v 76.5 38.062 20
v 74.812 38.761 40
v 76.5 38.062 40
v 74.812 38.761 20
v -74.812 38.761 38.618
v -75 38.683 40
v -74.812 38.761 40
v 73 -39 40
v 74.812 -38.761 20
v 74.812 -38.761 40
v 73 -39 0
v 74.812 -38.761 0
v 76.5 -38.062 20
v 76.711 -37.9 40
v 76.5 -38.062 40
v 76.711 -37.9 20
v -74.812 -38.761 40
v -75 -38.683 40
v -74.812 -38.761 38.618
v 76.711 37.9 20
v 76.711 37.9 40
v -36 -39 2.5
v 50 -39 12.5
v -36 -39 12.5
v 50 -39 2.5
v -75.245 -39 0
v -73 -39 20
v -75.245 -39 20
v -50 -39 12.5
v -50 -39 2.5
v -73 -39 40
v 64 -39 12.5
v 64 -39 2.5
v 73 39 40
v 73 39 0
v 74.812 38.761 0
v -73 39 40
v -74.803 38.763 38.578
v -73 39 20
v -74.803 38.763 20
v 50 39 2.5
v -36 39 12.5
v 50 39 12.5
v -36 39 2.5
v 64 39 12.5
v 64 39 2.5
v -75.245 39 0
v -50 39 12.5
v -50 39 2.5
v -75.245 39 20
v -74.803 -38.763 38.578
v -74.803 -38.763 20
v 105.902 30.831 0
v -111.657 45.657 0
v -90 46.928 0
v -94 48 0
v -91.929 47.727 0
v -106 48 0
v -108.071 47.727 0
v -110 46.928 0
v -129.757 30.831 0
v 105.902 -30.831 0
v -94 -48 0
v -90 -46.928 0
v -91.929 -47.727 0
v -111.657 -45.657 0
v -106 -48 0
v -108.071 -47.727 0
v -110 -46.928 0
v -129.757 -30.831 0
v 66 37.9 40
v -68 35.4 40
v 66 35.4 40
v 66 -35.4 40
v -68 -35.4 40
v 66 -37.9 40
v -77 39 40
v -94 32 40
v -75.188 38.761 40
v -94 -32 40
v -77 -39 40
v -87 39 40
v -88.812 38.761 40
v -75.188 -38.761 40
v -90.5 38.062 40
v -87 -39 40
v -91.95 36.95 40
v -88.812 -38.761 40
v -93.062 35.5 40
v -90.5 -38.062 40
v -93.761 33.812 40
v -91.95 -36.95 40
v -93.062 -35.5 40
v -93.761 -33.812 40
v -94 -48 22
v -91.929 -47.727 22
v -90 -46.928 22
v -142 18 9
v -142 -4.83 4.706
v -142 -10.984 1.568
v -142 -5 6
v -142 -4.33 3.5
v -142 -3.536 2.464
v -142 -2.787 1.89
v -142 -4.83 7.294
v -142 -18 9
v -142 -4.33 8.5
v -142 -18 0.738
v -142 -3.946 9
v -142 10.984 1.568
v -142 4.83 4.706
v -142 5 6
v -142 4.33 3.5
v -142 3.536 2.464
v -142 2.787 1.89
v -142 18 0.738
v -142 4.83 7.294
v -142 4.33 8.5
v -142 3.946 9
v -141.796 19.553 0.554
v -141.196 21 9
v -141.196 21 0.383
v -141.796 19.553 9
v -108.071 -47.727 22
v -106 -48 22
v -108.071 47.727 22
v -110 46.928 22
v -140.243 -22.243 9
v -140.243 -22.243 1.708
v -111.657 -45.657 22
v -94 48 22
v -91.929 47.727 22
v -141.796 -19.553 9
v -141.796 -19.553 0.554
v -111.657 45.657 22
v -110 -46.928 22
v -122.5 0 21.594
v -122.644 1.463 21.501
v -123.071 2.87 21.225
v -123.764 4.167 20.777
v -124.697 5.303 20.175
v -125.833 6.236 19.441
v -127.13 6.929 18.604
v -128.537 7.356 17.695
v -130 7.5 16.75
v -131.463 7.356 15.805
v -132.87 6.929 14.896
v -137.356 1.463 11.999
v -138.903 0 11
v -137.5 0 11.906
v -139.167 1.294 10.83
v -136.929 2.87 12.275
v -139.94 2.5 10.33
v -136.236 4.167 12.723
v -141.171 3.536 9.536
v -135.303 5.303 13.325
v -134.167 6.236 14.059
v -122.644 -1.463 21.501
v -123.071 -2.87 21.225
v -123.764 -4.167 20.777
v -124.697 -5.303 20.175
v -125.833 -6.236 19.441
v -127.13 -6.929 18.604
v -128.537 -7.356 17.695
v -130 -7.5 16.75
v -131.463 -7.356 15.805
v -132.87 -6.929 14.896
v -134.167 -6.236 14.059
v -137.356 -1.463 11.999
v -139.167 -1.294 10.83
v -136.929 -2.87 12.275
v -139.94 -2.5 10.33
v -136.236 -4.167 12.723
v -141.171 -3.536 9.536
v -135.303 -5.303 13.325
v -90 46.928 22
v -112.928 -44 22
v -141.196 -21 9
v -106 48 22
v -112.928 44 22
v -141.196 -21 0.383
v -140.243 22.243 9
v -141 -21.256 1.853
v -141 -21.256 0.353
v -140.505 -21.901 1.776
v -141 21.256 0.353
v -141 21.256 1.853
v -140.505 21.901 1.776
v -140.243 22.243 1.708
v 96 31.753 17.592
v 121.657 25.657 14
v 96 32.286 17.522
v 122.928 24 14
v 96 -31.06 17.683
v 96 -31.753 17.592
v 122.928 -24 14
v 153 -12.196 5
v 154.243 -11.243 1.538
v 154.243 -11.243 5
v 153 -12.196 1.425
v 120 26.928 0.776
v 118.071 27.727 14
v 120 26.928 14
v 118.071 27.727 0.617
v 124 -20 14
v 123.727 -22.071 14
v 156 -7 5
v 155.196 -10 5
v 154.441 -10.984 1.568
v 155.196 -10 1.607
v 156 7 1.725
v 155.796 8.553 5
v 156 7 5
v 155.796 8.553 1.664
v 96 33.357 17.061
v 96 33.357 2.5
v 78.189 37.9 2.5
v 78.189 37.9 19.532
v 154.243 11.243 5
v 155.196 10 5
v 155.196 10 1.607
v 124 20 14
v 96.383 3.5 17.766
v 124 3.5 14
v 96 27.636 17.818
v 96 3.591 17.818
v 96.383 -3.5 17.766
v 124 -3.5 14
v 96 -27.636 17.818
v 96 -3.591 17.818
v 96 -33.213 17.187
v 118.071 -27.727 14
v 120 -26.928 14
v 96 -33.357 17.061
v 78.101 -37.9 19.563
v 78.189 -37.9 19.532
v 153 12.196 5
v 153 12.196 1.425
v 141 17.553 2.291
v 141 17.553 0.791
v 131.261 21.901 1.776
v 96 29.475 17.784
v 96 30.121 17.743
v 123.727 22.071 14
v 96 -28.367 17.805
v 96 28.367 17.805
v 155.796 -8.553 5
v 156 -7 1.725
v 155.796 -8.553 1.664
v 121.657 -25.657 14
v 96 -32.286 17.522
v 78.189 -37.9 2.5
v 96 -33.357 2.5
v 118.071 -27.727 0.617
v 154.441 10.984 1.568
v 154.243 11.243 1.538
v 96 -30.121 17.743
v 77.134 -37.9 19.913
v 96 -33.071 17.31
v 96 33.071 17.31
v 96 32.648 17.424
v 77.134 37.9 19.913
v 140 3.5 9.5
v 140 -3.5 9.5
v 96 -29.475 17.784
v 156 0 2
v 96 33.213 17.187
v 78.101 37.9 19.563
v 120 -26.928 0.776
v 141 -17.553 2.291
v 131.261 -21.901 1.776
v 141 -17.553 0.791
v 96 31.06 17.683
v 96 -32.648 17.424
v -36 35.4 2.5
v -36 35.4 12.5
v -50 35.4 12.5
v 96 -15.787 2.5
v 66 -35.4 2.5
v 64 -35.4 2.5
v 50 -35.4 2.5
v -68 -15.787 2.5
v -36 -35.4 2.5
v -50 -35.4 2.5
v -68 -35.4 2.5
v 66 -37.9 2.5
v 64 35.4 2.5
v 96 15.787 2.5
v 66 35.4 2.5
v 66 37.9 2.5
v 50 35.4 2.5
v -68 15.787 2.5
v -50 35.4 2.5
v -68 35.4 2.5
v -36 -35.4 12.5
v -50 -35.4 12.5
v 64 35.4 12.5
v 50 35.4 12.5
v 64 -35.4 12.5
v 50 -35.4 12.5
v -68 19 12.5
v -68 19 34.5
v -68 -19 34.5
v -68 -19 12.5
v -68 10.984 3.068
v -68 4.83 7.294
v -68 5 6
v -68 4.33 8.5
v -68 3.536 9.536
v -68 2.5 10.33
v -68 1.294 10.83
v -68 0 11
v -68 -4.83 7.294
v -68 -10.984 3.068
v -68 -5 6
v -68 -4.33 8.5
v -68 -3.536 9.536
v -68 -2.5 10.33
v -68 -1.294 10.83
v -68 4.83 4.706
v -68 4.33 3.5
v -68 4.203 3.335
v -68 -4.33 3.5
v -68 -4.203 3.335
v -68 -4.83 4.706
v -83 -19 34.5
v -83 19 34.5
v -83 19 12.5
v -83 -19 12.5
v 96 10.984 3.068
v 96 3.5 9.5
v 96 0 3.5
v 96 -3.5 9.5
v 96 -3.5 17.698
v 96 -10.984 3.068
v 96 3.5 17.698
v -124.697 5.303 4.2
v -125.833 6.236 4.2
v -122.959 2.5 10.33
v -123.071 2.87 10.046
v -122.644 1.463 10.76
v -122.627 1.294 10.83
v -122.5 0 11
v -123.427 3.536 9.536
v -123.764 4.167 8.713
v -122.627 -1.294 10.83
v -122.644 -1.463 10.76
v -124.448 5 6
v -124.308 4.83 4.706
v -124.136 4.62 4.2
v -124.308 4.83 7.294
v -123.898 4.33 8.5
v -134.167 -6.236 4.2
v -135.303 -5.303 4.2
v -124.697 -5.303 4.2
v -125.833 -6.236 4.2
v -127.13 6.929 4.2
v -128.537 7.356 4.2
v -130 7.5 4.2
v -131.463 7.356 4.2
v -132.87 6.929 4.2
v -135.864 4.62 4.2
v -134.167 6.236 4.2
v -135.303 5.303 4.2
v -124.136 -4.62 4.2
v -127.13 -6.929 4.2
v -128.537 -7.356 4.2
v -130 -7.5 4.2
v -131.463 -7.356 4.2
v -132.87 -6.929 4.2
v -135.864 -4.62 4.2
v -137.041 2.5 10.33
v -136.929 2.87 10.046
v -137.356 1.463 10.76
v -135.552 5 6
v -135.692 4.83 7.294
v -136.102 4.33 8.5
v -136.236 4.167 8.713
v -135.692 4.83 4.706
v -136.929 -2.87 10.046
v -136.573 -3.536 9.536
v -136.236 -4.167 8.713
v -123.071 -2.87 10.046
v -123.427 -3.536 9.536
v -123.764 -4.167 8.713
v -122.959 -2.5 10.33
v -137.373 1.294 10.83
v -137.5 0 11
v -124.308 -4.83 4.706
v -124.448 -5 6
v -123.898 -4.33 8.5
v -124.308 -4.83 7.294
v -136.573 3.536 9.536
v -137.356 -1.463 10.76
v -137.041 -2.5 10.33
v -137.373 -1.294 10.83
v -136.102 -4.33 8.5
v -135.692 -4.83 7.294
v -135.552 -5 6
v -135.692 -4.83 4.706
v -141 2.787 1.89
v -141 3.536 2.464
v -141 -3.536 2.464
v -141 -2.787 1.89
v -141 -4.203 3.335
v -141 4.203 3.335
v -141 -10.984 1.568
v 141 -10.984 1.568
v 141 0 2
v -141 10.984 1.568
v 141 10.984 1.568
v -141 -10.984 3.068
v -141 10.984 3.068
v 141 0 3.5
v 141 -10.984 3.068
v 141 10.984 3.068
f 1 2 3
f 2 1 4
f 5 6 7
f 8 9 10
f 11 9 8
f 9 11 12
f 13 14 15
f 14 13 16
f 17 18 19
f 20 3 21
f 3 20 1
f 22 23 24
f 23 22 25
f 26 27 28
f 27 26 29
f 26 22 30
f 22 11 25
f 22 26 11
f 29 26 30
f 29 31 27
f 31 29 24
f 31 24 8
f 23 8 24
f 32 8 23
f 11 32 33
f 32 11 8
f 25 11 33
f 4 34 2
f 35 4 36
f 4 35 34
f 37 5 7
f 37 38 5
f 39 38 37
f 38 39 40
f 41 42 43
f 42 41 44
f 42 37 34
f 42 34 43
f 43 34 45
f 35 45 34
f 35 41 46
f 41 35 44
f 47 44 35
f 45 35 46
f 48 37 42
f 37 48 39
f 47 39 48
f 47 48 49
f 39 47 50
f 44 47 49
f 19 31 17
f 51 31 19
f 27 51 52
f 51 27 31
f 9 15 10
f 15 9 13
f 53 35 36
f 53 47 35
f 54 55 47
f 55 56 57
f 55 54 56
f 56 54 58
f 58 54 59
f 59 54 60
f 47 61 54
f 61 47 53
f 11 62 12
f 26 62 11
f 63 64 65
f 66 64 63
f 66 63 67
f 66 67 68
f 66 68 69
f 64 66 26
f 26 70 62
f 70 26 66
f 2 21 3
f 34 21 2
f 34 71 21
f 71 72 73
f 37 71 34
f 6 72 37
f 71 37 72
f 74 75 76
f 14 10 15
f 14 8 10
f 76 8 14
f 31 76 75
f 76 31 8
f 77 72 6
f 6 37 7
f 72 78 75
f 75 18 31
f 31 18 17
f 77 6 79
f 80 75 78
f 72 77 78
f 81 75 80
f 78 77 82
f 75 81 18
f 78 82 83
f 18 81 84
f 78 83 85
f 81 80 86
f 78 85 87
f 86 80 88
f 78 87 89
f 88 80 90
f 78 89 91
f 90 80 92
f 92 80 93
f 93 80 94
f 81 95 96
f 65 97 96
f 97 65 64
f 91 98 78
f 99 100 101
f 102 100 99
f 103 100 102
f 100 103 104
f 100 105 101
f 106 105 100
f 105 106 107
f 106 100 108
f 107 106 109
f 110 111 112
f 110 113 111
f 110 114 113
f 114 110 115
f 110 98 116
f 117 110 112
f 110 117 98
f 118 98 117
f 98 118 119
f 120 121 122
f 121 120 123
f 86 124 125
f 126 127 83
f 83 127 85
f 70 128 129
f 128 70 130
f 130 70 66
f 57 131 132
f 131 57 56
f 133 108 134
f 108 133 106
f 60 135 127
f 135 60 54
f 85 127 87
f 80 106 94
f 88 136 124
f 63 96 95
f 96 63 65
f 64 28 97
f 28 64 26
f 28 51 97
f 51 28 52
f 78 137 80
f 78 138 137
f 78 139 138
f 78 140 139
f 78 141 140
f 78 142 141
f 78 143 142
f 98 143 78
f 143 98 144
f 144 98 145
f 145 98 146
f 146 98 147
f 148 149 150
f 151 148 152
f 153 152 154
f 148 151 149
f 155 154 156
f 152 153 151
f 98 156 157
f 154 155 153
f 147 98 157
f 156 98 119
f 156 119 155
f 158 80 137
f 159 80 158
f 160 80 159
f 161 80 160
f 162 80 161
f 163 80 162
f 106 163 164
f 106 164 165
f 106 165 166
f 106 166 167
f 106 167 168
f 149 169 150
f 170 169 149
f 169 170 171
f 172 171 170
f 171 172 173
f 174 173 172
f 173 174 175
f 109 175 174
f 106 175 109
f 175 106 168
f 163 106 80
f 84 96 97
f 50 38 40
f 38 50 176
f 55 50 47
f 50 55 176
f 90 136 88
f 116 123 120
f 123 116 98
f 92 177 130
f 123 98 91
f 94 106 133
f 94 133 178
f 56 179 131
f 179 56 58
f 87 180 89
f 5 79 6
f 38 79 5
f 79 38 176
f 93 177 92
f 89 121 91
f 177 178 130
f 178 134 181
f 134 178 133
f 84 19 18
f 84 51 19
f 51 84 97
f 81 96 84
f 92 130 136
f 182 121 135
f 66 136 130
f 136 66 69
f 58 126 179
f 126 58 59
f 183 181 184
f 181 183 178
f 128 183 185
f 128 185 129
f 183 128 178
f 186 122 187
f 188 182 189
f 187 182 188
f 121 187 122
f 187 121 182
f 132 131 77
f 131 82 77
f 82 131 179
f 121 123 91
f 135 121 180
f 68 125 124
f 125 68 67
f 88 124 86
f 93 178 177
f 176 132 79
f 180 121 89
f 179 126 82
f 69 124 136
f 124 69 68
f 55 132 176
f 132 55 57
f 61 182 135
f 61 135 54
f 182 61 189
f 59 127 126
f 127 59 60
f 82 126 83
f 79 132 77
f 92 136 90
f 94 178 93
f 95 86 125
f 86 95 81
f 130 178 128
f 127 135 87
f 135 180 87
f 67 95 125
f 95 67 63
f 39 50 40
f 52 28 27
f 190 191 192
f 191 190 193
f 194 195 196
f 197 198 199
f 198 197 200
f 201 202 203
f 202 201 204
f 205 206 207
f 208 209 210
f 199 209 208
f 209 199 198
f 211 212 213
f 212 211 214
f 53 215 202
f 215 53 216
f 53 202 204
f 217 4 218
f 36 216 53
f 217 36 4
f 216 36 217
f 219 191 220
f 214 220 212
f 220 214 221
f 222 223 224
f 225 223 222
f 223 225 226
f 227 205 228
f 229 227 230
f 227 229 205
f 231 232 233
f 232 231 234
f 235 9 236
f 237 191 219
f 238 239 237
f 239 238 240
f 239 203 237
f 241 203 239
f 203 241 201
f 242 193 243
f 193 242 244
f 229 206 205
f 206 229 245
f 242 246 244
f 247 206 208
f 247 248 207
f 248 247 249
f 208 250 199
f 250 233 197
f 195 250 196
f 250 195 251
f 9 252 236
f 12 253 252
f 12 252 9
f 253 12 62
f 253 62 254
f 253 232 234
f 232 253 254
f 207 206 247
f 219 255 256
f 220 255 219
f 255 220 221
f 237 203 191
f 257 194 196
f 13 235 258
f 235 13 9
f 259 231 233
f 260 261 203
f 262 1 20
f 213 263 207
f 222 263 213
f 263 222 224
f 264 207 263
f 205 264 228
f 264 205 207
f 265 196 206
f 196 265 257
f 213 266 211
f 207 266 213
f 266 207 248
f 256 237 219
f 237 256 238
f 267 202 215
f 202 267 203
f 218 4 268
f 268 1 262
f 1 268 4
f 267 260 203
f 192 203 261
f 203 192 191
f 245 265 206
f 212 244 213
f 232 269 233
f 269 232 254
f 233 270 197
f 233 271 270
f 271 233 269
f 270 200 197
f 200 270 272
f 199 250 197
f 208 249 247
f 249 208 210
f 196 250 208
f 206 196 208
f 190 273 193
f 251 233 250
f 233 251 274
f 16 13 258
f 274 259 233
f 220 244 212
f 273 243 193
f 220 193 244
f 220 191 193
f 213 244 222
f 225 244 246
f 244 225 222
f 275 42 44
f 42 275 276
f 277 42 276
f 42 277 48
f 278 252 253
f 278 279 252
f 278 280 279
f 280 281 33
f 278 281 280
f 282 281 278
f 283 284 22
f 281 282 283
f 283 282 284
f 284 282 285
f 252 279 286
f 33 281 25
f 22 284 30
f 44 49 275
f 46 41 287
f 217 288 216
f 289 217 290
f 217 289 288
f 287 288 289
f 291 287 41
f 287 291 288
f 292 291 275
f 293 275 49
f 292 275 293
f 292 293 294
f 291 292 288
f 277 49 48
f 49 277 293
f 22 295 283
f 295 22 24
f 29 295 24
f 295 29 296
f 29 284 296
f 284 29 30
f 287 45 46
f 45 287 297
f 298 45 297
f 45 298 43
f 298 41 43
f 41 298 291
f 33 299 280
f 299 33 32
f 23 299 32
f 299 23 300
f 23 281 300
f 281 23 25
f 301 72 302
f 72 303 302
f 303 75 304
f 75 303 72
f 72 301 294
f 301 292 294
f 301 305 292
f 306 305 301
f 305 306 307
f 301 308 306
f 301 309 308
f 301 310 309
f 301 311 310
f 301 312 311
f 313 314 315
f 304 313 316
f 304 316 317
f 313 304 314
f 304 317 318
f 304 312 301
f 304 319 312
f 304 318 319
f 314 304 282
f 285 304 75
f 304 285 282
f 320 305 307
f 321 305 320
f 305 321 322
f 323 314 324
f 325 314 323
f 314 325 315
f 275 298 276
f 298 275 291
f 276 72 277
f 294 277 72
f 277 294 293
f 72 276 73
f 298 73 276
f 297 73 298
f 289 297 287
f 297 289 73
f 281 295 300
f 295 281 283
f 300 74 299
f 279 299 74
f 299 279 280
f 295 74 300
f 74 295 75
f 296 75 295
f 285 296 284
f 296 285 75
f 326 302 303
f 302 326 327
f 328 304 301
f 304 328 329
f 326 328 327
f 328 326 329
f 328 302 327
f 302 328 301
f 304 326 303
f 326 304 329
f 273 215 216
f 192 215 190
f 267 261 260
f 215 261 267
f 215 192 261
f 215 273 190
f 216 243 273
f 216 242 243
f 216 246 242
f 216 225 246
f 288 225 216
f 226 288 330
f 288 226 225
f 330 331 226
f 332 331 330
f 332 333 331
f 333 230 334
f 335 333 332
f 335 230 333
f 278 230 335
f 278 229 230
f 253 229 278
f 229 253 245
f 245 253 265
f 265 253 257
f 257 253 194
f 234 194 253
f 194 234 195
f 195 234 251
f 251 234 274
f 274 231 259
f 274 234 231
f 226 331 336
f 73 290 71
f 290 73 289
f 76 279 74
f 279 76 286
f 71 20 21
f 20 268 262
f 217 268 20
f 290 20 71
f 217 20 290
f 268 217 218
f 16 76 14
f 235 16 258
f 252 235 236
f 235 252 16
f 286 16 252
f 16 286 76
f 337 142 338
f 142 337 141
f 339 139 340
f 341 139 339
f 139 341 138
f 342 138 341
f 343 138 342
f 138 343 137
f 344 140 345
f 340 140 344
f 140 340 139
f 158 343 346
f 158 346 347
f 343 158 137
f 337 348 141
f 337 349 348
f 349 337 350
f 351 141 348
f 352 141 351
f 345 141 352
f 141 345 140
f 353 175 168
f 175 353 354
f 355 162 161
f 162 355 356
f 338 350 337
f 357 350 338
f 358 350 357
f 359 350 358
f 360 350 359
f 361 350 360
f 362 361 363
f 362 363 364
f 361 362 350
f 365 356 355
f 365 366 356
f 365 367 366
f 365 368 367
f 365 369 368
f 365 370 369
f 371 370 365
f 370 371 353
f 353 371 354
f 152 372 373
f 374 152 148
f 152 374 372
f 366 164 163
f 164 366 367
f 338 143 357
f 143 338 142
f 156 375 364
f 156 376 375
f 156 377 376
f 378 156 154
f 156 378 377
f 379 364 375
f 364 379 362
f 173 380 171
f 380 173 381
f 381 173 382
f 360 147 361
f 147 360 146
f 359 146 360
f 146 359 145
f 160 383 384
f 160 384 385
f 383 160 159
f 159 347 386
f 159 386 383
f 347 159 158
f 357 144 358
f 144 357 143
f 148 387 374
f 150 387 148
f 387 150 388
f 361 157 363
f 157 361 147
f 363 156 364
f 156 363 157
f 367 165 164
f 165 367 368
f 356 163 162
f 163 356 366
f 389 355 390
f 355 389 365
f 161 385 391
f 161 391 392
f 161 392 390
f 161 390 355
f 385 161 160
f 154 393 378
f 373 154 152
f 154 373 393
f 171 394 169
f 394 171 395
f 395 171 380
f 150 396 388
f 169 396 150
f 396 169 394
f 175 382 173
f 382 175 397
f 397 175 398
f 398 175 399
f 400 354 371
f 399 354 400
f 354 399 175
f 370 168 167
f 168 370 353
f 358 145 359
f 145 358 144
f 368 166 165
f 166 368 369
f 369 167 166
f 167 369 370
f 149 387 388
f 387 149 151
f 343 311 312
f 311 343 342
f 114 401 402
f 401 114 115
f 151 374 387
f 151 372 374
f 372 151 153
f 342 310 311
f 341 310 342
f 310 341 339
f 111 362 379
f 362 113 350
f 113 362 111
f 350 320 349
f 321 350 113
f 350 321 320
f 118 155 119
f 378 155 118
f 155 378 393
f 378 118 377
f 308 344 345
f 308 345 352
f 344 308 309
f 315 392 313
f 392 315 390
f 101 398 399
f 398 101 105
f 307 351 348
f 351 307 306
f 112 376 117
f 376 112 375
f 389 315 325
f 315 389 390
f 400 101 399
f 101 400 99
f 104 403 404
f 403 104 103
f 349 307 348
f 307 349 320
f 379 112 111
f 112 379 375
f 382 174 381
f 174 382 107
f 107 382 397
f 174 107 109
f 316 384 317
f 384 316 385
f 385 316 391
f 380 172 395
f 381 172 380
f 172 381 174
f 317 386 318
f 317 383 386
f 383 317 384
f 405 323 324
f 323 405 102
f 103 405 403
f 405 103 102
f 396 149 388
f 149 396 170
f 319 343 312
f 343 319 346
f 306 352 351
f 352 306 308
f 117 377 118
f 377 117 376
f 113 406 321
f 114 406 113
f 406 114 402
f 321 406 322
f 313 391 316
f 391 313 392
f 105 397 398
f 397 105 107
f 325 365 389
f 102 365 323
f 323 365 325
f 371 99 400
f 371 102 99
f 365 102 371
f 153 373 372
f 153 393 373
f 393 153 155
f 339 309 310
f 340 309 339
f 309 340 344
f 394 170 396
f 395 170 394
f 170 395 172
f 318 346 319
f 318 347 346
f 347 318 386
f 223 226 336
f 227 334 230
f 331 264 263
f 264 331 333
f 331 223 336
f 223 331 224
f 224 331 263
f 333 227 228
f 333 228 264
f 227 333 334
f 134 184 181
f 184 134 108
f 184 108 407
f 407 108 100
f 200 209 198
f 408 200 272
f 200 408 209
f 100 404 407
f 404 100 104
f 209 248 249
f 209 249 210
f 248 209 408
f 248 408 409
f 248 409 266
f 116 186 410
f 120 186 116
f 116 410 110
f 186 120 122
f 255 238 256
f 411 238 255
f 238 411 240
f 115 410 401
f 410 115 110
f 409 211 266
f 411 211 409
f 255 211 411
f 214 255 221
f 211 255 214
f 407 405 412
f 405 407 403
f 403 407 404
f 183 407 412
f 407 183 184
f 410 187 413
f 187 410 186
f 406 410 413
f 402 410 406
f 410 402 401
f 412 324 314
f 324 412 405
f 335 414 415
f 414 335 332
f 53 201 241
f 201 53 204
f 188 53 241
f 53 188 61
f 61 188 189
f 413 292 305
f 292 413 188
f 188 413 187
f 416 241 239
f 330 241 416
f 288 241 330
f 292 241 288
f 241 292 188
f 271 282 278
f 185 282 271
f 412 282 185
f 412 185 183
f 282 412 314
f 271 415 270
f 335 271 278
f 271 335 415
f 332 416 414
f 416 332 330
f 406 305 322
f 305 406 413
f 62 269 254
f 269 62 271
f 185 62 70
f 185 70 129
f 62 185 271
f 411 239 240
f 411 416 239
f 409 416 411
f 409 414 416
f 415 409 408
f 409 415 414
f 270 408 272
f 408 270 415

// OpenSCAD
// file: parts/007_pod_slide_dock_core.scad
// =============================================================================
// OpenMotorBridge - Satellite Pod: Open-Top Slide-In Dock Core (Aufnahmedock)
// =============================================================================
// File: hardware/cad/scad/02_pod_base/parts/007_pod_slide_dock_core.scad
// Description: Parametric core module defining the open-top cradle cavity for the
//              standard, 100% unchanged universal Pod base housing (135 x 70 x 38 mm).
//              Features:
//              1. 0.5 mm sliding clearance (135.5 x 70.5 x 38.0 mm)
//              2. Open top: Pod roof with Gore-Vent & GNSS patch antenna is exposed
//              3. Front M8 gland neck pocket (facing forward towards seat, -X)
//              4. Rear cartridge entrance mouth (facing rearward towards tail, +X)
//              5. Flank pockets for 4x EPDM strap hook lugs (X = 25 & 110 mm)
//              6. Transverse fender crown cradle at bottom
// =============================================================================

include <../../00_common/parameters.scad>;

// Standard Pod External Dimensions with clearance
DOCK_POD_L = POD_OUTER_L + 0.6; // 135.6 mm
DOCK_POD_W = POD_OUTER_W + 0.6; // 70.6 mm
DOCK_POD_H = POD_OUTER_H + 0.2; // 38.2 mm

// Subtraction tool to hollow out the open-top dock cradle
// Origin centered at (X = 0, Y = 0, Z = floor of dock)
module pod_slide_dock_subtraction(
    dock_l = DOCK_POD_L,
    dock_w = DOCK_POD_W,
    dock_h = DOCK_POD_H,
    open_sky_h = 50.0 // Cut through all material above pod roof
) {
    // 1. Main Pod Cavity (centered in X and Y, sitting at Z = 0 .. dock_h)
    translate([-dock_l/2.0, -dock_w/2.0, 0.0]) {
        // Main pod block plus infinite top clearance so pod roof is 100% exposed
        cube([dock_l, dock_w, dock_h + open_sky_h], center=false);
    }

    // 2. 4x Flank Pockets for Pod EPDM Strap Hooks
    // Hooks are located at X = 25.0 and X = 110.0 from pod front (-dock_l/2.0)
    // Hook width 8 mm, protrusion 3.0 mm, height 5 mm
    hook_x_offsets = [-dock_l/2.0 + 25.0, -dock_l/2.0 + (POD_OUTER_L - 25.0)];
    for (hx = hook_x_offsets) {
        // Left flank pocket (Y = +dock_w/2.0)
        translate([hx - 7.0, dock_w/2.0 - 0.5, 0.0])
            cube([14.0, 5.0, 10.0], center=false);

        // Right flank pocket (Y = -dock_w/2.0 - 4.5)
        translate([hx - 7.0, -dock_w/2.0 - 4.5, 0.0])
            cube([14.0, 5.0, 10.0], center=false);
    }

    // 3. Front Dual-Port Connector Pocket (facing -X towards seat)
    // Spans Port A (M8 at Y = -8.0 mm) and Port B (USB-C at Y = +8.0 mm)
    translate([-dock_l/2.0 - 15.0, -19.0, 19.0 - 9.0])
        cube([16.0, 38.0, 22.0], center=false);

    // 4. Rear Mouth Clearance (facing +X towards tail)
    // Allows the cartridge faceplate (width 74 mm, height 34 mm) to slide through cleanly
    translate([dock_l/2.0 - 2.0, -dock_w/2.0 - 2.5, 0.0])
        cube([30.0, dock_w + 5.0, dock_h + open_sky_h], center=false);
}

// Standalone preview module
module pod_slide_dock_preview() {
    difference() {
        // Outer demonstration block
        translate([-(DOCK_POD_L + 16.0)/2.0, -(DOCK_POD_W + 16.0)/2.0, -4.0])
            cube([DOCK_POD_L + 16.0, DOCK_POD_W + 16.0, DOCK_POD_H + 4.0], center=false);

        // Subtract the open dock cavity
        pod_slide_dock_subtraction();
    }
}

// Standalone execution preview
pod_slide_dock_preview();
// main file
// =============================================================================
// OpenMotorBridge - Satellite Pod 3: Touring Stealth Console (Typ D2)
// =============================================================================
// File: hardware/cad/scad/02_pod_base/pod3_touring_stealth_console.scad
// Description: Low-profile, OEM-integrated open-dock mounting console for
//              classic baggers and cruisers with 2-Up passenger seat.
//              Key Architecture:
//              1. 100% UNCHANGED POD: Fits the universal Pod base housing
//                 (pod_base_housing.stl, 135 x 70 x 38 mm) with 0.5 mm sliding fit.
//              2. OPEN-TOP DOCK: Zero double-housing! Pod roof with Gore-Vent breather
//                 and GNSS patch antenna is 100% exposed directly to the sky.
//              3. OEM PASSENGER SEAT MOUNTING: Front tongue anchors directly to the
//                 factory 1/4"-20 UNC fender nut behind the passenger seat.
//              4. SEAT-CONTOUR FRONT: Front hugs the curved tail of the passenger seat.
//              5. CONCEALED FORWARD CABLE ROUTING: M8 cable dives directly forward
//                 under the passenger seat into the bike's electrical harness.
//              6. REAR CARTRIDGE ACCESS & ANTENNA INTEGRATION: Cartridge slides in/out
//                 from the rear; smooth rear teardrop ducktail features a recessed
//                 aerodynamic snap-in clip channel for the rear-facing antenna.
//              7. FENDER PROTECTION: Compound concave saddle underside (R=140 mm
//                 transverse / R=320 mm longitudinal) with 1.5 mm EPDM pad recess.
// =============================================================================

include <../00_common/parameters.scad>;
use <parts/007_pod_slide_dock_core.scad>;

FENDER_R_TRANS = 140.0; // Harley Touring transverse crown radius (mm)
FENDER_R_LONG  = 320.0; // Harley Touring longitudinal wheel arch radius (mm)

// Dimensional Constants
TOURING_POD_L   = 136.0; // Dock bay length in X (centered at X=0)
TOURING_FUSE_W  = 78.0;  // Center fuselage width in Y (mm)
TOURING_SEAT_W  = 96.0;  // Front width hugging passenger seat in Y (mm)
TOURING_DOCK_H  = 40.0;  // Center rim height in Z (mm)
HALF_MOUTH_H    = 22.0;  // Front mouth connection height (half-height of pod)

// Longitudinal extents (mm):
// Front tip (1/4"-20 screw): X = -142.0
// Front pod mouth:           X = -68.0
// Rear pod mouth:            X = +68.0
// Rear teardrop tip:         X = +160.0
X_FRONT_TIP = -142.0;
X_POD_FRONT = -68.0;
X_POD_REAR  = +68.0;
X_REAR_TIP  = +160.0;

// Helper: 2D rounded rectangle extruded in Z for soft organic edges
module rounded_slab(l, w, h, r=6.0) {
    linear_extrude(height=h, center=false) {
        hull() {
            for (dx = [-l/2 + r, l/2 - r]) {
                for (dy = [-w/2 + r, w/2 - r]) {
                    translate([dx, dy]) circle(r=r, $fn=24);
                }
            }
        }
    }
}

module pod3_touring_stealth_console() {
    difference() {
        union() {
            // 1. Center Fuselage Cradle with soft rounded flanks (X in [-68, +68])
            hull() {
                translate([-TOURING_POD_L/2.0 + 1.0, 0, 0])
                    rounded_slab(2.0, TOURING_FUSE_W, TOURING_DOCK_H, r=7.0);
                translate([TOURING_POD_L/2.0 - 1.0, 0, 0])
                    rounded_slab(2.0, TOURING_FUSE_W, TOURING_DOCK_H, r=7.0);
            }

            // 2. Front Seat-Contoured Transition (The "SCHRÄGE", Full Height Z = 40.0 mm, X in [-142, -82])
            hull() {
                // Peak of front ramp (Full height Z = 40 mm)
                translate([-82.0, 0, 0])
                    rounded_slab(4.0, TOURING_FUSE_W, TOURING_DOCK_H, r=7.0);

                // Mid transition step hugging passenger seat tail
                translate([X_POD_FRONT - 32.0, 0, 0])
                    rounded_slab(4.0, TOURING_SEAT_W, 22.0, r=8.0);

                // Front 1/4"-20 mounting tongue tab
                translate([X_FRONT_TIP + 10.0, 0, 0])
                    rounded_slab(20.0, 48.0, 9.0, r=6.0);
            }

            // 3. Intermediate Waist (The "ETWAS_FREI" -> HALBHOCH, Z = 20.0 mm, X in [-82, -68])
            // Connects the full-height front ramp and full-height cradle at half height
            hull() {
                translate([-82.0, 0, 0])
                    rounded_slab(4.0, TOURING_FUSE_W, 20.0, r=7.0);
                translate([X_POD_FRONT, 0, 0])
                    rounded_slab(4.0, TOURING_FUSE_W, 20.0, r=7.0);
            }

            // 4. Rear Teardrop Ducktail at Kassetteneinschub (X in [+68, +160])
            // Connects HALF-HIGH (Z = 20.0 mm) at the rear cartridge mouth for tool-free finger access
            hull() {
                // Junction at rear pod mouth (half-height Z = 20 mm)
                translate([X_POD_REAR - 1.0, 0, 0])
                    rounded_slab(2.0, TOURING_FUSE_W, 20.0, r=7.0);

                // Mid slope
                translate([X_POD_REAR + 42.0, 0, 0])
                    rounded_slab(4.0, 56.0, 14.0, r=8.0);

                // Rear teardrop tip
                translate([X_REAR_TIP - 12.0, 0, 0])
                    rounded_slab(16.0, 26.0, 5.0, r=6.0);
            }

            // Rear flank blend: raises side walls from half-height rear mouth up to 40 mm
            hull() {
                translate([X_POD_REAR - 1.0, 0, 0])
                    rounded_slab(2.0, TOURING_FUSE_W, 20.0, r=7.0);
                translate([X_POD_REAR - 16.0, 0, 0])
                    rounded_slab(2.0, TOURING_FUSE_W, TOURING_DOCK_H, r=7.0);
            }
        }

        // =====================================================================
        // SUBTRACTIONS
        // =====================================================================

        // A. Open-Top Slide-In Pod Dock Cavity (centered at X=0, Y=0, Z=2.5 mm floor)
        translate([0, 0, 2.5]) {
            pod_slide_dock_subtraction(
                dock_l = TOURING_POD_L,
                dock_w = 70.8,
                dock_h = 38.2,
                open_sky_h = 50.0
            );
        }

        // B. Front 1/4"-20 Passenger Seat Screw Mounting Hole (at X = -130.0 mm)
        // Through-hole Ø 7.0 mm (clears 1/4" / 6.35 mm screw with tolerance)
        translate([X_FRONT_TIP + 12.0, 0, -5.0])
            cylinder(r=3.5, h=25.0, center=false, $fn=32);

        // Counterbore pocket for screw head & washer (Ø 15.0 mm, depth 5.0 mm)
        translate([X_FRONT_TIP + 12.0, 0, 4.2])
            cylinder(r=7.5, h=20.0, center=false, $fn=32);

        // C. Forward M8 Cable Tunnel (dives forward under seat into bike harness)
        // Bore running from M8 neck (X = -75) forward to front nose (X = -145)
        translate([X_FRONT_TIP - 2.0, 0, 6.0]) {
            rotate([0, 90, 0])
                cylinder(r=5.0, h=abs(X_FRONT_TIP - X_POD_FRONT) + 5.0, center=false, $fn=24);
        }

        // D. Rear-Facing Antenna Snap-in Retention Channel (along dorsal ridge of ducktail)
        // Semi-cylindrical groove (Ø 9.2 mm, length 72 mm) along X in [+78, +150] mm
        translate([X_POD_REAR + 10.0, 0, 17.5]) {
            rotate([0, 80, 0]) // Follows the gentle downward slope of the teardrop
                cylinder(r=4.6, h=72.0, center=false, $fn=24);
        }

        // Top slot for antenna snap insertion
        translate([X_POD_REAR + 8.0, -3.5, 9.5])
            cube([75.0, 7.0, 18.0], center=false);

        // E. Compound Concave Cylindrical Fender Saddle Underside (R=140 mm transverse)
        // Arch restricted to Z <= 4.0 mm, leaving solid 2.5 mm floor everywhere
        translate([0, 0, -(FENDER_R_TRANS - 2.0)]) {
            rotate([0, 90, 0])
                cylinder(r=FENDER_R_TRANS, h=abs(X_FRONT_TIP) + X_REAR_TIP + 20.0, center=true, $fn=80);
        }

        // F. Recessed Pocket for 1.5 mm EPDM Anti-Scratch Damping Pad
        translate([0, 0, -(FENDER_R_TRANS - 3.5)]) {
            rotate([0, 90, 0])
                cylinder(r=FENDER_R_TRANS, h=abs(X_FRONT_TIP) + X_REAR_TIP - 20.0, center=true, $fn=80);
        }
    }
}

// Standalone compilation / preview
pod3_touring_stealth_console();
